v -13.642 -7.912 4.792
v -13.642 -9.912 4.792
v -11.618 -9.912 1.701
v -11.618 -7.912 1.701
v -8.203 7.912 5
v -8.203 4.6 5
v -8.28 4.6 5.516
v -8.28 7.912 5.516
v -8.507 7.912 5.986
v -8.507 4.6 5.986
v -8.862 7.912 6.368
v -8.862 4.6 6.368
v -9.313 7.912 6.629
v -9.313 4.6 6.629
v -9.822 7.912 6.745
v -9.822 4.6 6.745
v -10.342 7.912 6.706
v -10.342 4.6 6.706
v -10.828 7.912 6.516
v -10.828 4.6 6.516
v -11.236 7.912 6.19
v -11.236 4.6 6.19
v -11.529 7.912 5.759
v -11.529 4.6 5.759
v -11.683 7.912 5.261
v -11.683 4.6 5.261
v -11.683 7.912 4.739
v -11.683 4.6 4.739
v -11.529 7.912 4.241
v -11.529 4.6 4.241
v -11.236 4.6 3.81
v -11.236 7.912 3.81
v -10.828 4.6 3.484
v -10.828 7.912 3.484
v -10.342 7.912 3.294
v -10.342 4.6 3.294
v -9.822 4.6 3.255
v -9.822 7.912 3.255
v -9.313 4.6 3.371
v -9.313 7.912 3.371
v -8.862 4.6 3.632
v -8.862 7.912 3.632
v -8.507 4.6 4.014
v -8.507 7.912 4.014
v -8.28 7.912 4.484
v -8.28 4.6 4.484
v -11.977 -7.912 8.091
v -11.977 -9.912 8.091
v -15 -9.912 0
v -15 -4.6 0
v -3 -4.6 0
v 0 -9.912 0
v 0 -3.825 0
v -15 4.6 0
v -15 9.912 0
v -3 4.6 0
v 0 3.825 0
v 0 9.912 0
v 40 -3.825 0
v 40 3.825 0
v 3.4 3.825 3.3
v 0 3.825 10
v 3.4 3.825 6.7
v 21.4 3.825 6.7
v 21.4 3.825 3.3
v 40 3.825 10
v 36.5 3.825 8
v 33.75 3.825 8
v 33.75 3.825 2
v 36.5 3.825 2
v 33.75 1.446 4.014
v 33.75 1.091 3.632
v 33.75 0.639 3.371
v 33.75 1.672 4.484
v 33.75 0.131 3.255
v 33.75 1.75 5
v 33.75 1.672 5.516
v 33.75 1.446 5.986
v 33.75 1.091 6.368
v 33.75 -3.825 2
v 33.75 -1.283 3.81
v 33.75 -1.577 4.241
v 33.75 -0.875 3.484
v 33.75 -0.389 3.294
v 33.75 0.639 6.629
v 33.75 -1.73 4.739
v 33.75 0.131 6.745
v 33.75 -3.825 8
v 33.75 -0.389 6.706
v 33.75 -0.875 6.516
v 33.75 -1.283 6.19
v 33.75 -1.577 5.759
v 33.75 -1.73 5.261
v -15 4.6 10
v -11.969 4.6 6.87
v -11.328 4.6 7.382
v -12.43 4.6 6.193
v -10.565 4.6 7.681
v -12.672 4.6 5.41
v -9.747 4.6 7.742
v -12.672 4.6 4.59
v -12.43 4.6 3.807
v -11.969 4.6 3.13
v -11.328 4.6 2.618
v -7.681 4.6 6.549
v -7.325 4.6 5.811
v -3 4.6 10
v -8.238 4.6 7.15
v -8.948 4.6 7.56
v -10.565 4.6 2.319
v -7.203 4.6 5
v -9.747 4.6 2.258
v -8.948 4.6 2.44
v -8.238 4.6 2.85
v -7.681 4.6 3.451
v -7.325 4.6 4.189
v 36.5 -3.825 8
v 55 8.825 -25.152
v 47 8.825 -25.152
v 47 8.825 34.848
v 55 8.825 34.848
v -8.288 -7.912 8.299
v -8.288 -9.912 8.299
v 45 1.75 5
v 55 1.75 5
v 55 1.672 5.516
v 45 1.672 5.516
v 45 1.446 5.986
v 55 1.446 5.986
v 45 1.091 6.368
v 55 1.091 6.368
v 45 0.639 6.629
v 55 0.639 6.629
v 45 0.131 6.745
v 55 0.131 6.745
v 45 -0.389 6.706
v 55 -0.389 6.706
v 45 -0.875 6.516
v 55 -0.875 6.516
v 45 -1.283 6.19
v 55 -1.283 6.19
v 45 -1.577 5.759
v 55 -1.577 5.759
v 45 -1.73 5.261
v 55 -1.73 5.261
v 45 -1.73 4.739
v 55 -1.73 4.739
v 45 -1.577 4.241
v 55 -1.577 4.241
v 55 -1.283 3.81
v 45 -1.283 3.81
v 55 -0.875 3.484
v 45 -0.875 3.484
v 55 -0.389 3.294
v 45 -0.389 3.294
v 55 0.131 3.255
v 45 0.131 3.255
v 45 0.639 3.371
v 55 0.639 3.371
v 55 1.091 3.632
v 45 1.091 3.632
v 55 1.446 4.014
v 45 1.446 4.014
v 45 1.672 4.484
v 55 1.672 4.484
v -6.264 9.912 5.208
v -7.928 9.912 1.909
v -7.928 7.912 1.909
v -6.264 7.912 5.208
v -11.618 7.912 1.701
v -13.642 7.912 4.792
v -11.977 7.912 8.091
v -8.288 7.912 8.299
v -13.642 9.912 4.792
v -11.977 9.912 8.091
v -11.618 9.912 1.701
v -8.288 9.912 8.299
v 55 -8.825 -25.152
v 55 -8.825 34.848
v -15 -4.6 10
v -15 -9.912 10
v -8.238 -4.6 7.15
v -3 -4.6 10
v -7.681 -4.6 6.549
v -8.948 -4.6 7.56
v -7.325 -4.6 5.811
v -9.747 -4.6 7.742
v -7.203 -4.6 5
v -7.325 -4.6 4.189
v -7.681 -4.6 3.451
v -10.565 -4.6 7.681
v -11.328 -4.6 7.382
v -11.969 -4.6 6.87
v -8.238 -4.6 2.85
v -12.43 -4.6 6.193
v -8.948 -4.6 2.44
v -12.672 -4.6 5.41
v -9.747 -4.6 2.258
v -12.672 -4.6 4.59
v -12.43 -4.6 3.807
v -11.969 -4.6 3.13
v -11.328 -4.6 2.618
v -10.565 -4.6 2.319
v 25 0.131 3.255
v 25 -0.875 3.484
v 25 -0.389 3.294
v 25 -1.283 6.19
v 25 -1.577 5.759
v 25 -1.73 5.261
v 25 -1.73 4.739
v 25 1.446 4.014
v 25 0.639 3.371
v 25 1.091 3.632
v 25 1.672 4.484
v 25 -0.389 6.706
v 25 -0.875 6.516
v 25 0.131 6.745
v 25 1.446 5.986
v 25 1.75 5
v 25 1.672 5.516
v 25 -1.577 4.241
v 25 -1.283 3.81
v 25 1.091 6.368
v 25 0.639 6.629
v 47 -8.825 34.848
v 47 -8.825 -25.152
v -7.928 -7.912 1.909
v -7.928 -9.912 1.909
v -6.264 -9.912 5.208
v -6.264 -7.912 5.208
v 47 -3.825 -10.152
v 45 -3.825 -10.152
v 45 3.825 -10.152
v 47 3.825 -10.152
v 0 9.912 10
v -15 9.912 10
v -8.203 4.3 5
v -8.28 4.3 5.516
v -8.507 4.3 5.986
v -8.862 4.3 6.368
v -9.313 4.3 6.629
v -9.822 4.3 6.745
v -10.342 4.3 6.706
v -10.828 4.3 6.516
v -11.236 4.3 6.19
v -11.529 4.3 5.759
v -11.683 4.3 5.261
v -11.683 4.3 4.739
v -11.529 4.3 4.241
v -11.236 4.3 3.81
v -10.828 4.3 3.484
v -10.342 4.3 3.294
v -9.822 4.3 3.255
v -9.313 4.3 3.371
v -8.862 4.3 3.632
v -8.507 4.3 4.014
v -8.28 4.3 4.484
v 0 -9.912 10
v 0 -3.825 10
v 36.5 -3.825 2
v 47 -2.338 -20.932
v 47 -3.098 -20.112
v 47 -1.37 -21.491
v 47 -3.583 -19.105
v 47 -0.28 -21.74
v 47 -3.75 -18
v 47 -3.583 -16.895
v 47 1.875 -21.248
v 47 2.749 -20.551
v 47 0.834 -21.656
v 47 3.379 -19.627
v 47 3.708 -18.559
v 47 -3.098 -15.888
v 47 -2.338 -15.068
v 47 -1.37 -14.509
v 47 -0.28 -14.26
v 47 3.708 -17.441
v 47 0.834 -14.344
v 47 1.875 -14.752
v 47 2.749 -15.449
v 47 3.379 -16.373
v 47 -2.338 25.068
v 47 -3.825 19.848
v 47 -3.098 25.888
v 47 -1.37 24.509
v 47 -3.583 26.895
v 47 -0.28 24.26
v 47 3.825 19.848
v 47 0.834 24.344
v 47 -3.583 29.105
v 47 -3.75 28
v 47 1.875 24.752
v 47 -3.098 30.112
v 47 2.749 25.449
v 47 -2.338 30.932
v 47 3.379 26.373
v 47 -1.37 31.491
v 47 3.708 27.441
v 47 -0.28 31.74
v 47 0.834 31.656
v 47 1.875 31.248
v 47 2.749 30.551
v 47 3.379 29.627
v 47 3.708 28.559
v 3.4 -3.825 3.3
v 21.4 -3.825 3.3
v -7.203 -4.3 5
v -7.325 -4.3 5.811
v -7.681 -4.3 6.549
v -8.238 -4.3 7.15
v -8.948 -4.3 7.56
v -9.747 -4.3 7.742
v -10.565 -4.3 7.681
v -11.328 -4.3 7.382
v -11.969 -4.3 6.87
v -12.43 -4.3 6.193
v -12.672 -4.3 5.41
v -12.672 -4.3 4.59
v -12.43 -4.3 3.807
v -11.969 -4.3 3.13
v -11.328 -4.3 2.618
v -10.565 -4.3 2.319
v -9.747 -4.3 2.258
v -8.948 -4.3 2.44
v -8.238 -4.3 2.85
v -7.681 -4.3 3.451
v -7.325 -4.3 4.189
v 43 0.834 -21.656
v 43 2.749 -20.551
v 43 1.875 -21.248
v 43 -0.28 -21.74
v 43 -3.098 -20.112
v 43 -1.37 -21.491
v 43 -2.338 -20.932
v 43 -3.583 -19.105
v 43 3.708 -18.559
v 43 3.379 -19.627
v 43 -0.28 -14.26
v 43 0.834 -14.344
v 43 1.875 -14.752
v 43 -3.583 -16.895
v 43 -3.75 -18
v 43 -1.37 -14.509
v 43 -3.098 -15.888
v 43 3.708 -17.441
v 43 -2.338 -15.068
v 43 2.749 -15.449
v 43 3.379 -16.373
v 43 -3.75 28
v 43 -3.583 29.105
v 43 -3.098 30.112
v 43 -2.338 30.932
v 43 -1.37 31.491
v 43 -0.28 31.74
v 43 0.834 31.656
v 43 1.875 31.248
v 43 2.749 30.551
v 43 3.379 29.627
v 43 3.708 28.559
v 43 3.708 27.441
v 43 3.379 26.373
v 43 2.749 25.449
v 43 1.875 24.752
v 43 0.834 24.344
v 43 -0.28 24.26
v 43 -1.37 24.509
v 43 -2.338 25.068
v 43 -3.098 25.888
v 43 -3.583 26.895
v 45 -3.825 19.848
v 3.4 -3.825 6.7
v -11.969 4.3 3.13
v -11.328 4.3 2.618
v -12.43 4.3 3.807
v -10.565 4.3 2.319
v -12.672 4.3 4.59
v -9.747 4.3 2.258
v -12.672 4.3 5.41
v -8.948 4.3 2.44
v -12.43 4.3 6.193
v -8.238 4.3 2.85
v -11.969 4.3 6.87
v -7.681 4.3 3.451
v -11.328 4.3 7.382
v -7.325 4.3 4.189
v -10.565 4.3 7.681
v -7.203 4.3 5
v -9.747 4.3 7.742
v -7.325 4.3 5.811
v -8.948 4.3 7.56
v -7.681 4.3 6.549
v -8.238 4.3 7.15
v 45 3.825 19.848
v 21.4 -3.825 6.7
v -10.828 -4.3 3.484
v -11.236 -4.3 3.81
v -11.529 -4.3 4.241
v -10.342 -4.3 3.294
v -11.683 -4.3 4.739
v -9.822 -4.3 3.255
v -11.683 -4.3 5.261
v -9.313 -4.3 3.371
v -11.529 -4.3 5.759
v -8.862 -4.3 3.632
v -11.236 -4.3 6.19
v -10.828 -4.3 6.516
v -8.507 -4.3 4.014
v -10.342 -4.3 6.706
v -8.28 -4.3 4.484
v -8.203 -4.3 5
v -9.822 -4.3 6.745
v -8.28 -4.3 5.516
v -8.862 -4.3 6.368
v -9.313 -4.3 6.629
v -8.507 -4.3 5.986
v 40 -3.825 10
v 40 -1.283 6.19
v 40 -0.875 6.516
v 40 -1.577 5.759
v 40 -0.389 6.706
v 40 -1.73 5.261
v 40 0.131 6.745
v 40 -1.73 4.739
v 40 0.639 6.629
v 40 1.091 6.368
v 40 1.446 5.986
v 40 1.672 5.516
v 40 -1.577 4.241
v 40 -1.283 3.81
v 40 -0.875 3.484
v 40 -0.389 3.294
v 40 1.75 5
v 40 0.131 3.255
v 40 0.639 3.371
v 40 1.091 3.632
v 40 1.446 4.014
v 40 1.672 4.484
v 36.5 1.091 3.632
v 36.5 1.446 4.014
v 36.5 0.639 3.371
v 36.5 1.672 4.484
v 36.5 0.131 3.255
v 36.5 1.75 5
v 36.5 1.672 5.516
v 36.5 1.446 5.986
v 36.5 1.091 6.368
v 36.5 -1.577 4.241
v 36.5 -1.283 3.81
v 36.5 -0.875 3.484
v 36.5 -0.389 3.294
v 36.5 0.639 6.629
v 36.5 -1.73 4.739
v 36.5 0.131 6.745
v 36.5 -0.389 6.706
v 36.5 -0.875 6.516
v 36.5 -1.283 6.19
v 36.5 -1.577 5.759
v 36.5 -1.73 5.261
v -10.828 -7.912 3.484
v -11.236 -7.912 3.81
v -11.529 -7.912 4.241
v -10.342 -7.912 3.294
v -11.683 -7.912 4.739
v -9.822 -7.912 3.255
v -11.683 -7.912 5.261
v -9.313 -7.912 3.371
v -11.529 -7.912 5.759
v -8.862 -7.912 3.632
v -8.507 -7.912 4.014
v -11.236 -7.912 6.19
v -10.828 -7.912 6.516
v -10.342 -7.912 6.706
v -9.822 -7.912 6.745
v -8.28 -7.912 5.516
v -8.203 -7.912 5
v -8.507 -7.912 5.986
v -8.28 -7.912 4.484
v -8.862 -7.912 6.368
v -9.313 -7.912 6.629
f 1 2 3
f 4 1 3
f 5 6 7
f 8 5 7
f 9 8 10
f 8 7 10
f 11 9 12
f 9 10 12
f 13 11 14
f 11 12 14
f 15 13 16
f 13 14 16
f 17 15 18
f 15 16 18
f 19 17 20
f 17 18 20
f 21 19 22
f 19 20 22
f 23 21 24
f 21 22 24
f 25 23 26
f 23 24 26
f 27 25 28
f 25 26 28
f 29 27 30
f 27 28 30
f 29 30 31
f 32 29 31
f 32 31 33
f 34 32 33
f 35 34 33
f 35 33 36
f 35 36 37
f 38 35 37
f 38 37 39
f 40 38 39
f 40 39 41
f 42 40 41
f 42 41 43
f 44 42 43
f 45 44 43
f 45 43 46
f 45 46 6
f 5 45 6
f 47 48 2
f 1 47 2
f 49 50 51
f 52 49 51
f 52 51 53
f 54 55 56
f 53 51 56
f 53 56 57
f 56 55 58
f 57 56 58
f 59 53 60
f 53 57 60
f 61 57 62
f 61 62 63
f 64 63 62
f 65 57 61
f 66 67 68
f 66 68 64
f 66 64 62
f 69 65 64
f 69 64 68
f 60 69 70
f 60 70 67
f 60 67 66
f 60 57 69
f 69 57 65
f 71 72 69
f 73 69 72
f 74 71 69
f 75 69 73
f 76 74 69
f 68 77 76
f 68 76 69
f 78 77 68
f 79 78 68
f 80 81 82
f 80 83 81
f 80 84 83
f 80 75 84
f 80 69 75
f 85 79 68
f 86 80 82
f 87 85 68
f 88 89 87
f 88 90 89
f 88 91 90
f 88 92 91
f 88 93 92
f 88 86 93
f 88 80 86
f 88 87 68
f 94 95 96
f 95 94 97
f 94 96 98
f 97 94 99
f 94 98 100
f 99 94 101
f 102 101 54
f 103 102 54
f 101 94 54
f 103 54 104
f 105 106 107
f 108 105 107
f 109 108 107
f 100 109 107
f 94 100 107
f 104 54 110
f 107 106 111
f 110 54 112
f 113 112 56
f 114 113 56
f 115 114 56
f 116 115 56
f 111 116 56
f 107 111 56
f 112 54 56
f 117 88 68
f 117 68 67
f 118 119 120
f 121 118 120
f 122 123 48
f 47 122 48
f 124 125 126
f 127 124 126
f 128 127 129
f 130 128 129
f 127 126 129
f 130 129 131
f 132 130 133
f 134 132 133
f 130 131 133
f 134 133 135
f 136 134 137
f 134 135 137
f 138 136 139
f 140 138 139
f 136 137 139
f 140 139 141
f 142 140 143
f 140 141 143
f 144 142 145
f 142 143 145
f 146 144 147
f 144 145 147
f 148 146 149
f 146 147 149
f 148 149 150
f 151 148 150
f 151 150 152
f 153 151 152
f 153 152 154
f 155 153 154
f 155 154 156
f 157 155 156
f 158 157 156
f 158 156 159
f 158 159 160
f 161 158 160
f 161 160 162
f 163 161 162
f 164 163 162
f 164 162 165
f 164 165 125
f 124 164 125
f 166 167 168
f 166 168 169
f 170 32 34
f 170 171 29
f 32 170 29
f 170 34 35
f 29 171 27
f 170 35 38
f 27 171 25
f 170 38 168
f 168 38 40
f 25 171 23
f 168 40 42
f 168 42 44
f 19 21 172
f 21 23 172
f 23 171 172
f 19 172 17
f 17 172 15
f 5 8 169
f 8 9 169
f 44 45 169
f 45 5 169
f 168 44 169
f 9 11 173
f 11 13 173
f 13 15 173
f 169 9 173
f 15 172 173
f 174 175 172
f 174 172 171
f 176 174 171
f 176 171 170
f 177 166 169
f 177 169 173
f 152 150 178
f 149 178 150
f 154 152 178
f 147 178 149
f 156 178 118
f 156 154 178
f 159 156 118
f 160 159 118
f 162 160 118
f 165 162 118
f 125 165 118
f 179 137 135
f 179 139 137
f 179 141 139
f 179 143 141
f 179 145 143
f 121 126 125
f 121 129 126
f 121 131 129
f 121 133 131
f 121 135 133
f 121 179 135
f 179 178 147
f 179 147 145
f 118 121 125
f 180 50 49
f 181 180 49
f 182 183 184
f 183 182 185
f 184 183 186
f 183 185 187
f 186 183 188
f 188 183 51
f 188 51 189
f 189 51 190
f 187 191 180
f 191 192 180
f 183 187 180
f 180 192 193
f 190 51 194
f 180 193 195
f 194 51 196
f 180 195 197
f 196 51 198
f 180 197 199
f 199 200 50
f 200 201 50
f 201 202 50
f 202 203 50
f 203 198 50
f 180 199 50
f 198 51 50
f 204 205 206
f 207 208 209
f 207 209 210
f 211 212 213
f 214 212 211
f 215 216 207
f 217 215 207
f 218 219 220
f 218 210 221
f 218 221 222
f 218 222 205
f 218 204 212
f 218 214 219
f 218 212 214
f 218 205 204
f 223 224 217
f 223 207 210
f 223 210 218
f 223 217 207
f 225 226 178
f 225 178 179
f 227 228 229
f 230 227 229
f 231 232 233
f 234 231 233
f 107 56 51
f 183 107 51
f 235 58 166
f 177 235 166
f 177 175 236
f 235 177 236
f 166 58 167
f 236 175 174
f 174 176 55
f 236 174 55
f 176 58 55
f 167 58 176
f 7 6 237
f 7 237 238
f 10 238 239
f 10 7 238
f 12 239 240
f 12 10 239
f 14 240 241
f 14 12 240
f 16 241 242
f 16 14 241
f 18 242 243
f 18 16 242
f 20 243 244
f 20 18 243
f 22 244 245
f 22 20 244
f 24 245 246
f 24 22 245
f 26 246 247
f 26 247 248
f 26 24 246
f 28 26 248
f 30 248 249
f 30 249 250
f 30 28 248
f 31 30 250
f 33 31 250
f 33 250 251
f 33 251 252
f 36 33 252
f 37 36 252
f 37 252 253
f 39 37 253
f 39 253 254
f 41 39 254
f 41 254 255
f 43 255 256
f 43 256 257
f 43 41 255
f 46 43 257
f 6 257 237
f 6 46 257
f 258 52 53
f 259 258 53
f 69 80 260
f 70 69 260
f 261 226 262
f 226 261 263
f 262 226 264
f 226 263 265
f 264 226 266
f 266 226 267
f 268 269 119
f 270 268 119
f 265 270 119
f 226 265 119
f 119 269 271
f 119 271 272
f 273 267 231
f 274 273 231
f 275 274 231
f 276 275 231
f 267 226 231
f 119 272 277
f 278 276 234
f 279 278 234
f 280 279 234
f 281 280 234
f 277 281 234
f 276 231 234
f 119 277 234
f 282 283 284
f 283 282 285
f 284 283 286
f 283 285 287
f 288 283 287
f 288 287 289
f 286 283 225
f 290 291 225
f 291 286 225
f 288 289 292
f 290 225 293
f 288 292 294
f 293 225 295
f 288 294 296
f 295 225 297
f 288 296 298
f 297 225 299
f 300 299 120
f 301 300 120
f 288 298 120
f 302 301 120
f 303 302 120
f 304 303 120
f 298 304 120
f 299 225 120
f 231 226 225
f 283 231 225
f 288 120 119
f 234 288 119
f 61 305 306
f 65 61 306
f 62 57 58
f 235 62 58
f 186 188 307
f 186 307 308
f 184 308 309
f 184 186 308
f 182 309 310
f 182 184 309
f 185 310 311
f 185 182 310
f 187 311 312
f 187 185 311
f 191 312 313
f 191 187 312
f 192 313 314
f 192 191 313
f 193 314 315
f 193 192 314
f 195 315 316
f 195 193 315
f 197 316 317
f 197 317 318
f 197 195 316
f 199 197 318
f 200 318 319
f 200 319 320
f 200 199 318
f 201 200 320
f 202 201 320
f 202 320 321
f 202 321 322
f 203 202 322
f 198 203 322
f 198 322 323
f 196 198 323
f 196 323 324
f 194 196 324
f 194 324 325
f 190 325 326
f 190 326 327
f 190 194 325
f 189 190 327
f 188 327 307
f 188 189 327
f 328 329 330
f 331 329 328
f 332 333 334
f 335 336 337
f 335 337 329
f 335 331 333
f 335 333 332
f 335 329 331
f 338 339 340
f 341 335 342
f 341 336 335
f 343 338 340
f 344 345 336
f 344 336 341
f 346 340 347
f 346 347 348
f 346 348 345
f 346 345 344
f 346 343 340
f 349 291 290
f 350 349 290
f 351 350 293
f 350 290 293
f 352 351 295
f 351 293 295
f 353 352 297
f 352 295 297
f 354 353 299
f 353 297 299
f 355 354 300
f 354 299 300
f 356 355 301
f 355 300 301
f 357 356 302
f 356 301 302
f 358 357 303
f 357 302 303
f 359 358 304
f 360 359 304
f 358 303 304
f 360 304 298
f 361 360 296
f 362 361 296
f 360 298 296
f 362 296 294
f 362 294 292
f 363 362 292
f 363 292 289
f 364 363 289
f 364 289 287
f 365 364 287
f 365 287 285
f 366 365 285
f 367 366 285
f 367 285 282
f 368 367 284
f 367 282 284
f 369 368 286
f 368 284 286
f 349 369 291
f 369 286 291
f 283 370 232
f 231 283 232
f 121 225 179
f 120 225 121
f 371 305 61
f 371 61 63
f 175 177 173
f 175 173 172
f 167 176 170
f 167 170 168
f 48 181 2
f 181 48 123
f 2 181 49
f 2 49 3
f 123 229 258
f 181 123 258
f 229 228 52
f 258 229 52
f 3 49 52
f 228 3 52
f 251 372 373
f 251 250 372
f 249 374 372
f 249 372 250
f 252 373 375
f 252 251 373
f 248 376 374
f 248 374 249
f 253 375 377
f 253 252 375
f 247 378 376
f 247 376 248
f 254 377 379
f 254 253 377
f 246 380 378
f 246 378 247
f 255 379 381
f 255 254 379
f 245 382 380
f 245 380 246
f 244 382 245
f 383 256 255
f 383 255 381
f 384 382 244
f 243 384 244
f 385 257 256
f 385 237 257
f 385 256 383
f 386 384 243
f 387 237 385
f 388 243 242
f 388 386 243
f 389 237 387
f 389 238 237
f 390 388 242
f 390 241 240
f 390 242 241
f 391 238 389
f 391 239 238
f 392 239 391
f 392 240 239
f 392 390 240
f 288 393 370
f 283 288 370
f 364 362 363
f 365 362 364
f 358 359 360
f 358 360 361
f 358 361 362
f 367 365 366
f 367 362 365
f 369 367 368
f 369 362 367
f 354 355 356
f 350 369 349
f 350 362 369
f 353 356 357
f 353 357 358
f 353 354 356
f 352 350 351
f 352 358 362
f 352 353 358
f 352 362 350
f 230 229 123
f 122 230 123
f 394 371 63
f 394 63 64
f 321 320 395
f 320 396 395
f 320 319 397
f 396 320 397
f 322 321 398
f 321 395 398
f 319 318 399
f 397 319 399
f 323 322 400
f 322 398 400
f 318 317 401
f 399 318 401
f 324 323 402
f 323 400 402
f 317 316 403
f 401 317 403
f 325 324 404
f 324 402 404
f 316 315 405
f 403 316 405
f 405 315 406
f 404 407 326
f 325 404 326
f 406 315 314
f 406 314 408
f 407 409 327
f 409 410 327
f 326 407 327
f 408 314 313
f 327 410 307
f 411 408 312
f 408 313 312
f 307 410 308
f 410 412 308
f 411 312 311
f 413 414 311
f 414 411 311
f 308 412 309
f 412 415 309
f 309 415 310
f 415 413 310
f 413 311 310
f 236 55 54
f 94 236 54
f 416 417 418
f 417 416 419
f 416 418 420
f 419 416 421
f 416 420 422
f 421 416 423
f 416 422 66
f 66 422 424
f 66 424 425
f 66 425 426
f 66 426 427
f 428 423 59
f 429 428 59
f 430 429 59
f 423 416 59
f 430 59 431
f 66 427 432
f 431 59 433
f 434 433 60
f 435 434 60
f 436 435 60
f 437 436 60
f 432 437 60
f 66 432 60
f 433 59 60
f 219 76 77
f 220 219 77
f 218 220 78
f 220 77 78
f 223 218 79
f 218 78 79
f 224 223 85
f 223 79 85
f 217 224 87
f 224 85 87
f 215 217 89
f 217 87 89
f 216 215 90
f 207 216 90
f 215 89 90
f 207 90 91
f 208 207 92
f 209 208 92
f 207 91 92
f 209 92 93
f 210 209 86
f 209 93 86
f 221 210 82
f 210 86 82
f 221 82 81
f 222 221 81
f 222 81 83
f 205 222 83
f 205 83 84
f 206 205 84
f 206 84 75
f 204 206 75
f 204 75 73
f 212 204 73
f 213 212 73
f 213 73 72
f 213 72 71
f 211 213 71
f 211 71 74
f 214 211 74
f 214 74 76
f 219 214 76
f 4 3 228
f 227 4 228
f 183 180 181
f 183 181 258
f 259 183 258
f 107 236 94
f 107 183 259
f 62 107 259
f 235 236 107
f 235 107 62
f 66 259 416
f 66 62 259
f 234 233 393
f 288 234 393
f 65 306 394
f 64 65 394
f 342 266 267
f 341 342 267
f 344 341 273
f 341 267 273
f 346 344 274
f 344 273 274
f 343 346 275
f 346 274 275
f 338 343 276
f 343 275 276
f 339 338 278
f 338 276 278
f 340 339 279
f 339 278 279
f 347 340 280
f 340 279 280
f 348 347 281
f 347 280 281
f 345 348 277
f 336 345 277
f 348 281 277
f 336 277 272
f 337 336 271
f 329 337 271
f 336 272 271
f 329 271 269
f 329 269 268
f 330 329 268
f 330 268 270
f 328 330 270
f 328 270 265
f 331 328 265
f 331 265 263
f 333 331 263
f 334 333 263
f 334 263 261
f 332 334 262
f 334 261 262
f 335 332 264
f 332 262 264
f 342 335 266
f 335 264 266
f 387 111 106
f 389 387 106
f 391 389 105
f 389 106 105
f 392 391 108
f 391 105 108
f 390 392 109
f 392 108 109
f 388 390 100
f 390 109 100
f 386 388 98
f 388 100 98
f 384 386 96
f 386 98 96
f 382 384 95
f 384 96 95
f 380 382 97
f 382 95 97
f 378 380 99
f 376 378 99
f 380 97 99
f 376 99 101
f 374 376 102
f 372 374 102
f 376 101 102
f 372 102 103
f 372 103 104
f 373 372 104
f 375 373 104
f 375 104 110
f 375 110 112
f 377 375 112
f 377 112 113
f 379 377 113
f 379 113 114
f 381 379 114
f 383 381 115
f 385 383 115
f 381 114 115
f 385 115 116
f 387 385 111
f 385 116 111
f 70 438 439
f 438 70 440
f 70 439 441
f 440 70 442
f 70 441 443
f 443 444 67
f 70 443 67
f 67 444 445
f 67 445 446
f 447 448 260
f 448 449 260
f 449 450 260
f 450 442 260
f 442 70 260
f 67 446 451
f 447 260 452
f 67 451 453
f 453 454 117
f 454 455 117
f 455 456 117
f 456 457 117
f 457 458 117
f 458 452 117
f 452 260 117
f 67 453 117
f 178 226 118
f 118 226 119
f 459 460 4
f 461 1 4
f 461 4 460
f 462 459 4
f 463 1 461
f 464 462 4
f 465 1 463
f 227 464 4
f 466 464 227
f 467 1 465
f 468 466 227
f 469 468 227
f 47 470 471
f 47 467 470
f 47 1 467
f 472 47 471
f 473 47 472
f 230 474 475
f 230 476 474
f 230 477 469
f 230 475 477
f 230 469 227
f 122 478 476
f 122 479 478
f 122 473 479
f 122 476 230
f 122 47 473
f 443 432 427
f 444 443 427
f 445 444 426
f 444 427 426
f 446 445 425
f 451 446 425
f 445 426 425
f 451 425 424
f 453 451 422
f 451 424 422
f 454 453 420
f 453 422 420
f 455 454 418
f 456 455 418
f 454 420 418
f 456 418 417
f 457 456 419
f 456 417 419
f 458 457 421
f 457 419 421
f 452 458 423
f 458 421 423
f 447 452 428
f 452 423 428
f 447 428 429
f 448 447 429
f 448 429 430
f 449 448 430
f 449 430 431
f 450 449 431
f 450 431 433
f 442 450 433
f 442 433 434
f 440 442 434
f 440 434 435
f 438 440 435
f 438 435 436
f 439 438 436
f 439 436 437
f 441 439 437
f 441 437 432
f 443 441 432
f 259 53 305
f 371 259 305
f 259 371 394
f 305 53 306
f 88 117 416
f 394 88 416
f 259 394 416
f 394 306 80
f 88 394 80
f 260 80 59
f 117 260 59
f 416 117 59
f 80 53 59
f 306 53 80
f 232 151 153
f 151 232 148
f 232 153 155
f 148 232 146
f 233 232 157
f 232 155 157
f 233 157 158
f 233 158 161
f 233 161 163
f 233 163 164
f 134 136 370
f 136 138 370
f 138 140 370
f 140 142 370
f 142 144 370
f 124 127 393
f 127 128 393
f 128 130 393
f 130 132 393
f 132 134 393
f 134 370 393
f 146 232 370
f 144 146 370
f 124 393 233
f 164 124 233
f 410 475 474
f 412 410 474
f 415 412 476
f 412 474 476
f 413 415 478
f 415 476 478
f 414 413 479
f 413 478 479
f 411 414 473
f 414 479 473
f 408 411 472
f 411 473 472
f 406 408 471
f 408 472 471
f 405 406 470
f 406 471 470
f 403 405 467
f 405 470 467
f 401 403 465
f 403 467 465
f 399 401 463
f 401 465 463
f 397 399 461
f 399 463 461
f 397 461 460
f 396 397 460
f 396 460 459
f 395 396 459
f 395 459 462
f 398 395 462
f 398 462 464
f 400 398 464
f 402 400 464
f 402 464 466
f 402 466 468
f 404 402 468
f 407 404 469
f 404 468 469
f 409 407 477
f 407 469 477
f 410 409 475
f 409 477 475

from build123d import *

# Parameters (mm, degrees)
F0_W      = 40
F0_H      = 3.825
F1_DEPTH  = 10
F2_R      = 1.75
F3_DEPTH  = 19.8241538475
F4_W      = 18
F4_H      = 3.4
F4_W_2    = 2.75
F4_H_2    = 6
F5_DEPTH  = 13.7375769237
F6_R      = 1.75
F7_DEPTH  = 15
F10_DEPTH = 2
F11_W     = 17.65
F11_H     = 60
F12_DEPTH = 8
F13_R     = 1.75
F14_DEPTH = 70.001
F15_R     = 2.75
F15_R_2   = 1.75
F16_DEPTH = 0.3
F17_R     = 1.75
F18_DEPTH = 2
F19_R     = 3.75
F20_DEPTH = 4


# Not quite as in the source:
# - a pattern or mirror of a feature is missing from the dataset's text; its kind, count and spacing are read off the source's solid


with BuildPart() as f1:
    # F0 (on Top) → F1 (new body)
    with BuildSketch(Plane.XY):
        Polygon((0, -3.825), (0, 0), (-3, 0), (-3, -4.6), (-15, -4.6), (-15, -9.9115769237), (0, -9.9115769237), align=None)
        Polygon((-3, 0), (0, 0), (0, 3.825), (0, 9.9115769237), (-15, 9.9115769237), (-15, 4.6), (-3, 4.6), align=None)
        with Locations((20, 1.9125)):
            Rectangle(F0_W, F0_H)
        with Locations((20, -1.9125)):
            Rectangle(F0_W, F0_H)
    extrude(amount=F1_DEPTH)

    # F2 (on face) → F3 (cut, through all)
    with BuildSketch(Plane.XZ.offset(9.9115769237)):
        with Locations((-9.9527407438, 5)):
            Circle(F2_R)
    extrude(amount=-F3_DEPTH, mode=Mode.SUBTRACT)

    # F4 (on face) → F5 (cut, through all)
    with BuildSketch(Plane.XZ.offset(3.825)):
        with Locations((12.4002694301, 5)):
            Rectangle(F4_W, F4_H)
        with Locations((35.125, 5)):
            Rectangle(F4_W_2, F4_H_2)
    extrude(amount=-F5_DEPTH, mode=Mode.SUBTRACT)

    # F6 (on face) → F7 (cut)
    with BuildSketch(Plane.YZ.offset(40)):
        with Locations((0, 5)):
            Circle(F6_R)
    extrude(amount=-F7_DEPTH, mode=Mode.SUBTRACT)

    # F15 (on face) → F16 (join)
    with BuildSketch(Plane.XZ.offset(-4.6)):
        with Locations((-9.9527407438, 5)):
            Circle(F15_R)
        with Locations((-9.9527407438, 5)):
            Circle(F15_R_2, mode=Mode.SUBTRACT)
    f16 = extrude(amount=F16_DEPTH)

    # F16_copies: F16 across plane
    add(f16.mirror(Plane(origin=(0, 0, 0), x_dir=(0, 0, -1), z_dir=(0, -1, 0))))

    # F17 (on face) → F18 (cut)
    with BuildSketch(Plane.XZ.offset(9.9115769237)):
        Polygon((-7.9284293953, 1.9088033227), (-6.2635302189, 5.2075067143), (-8.2878415673, 8.2987033916), (-11.9770520922, 8.0911966773), (-13.6419512686, 4.7924932857), (-11.6176399202, 1.7012966084), align=None)
        with Locations((-9.9527407438, 5)):
            Circle(F17_R, mode=Mode.SUBTRACT)
    f18 = extrude(amount=-F18_DEPTH, mode=Mode.SUBTRACT)

    # F18_copies: F18 across plane
    add(f18.mirror(Plane.ZX), mode=Mode.SUBTRACT)


with BuildPart() as f10:
    # F9 (on offset) → F10 (new body)
    with BuildSketch(Plane.YZ.offset(45)):
        Polygon((3.825, 0), (3.825, 10), (3.825, 19.8484882712), (-3.825, 19.8484882712), (-3.825, 10), (-3.825, 0), (-3.825, -10.1515117288), (3.825, -10.1515117288), align=None)
    extrude(amount=F10_DEPTH)

    # F11 (on face) → F12 (join)
    with BuildSketch(Plane.YZ.offset(47)):
        with Locations((0, 4.8484882712)):
            Rectangle(F11_W, F11_H)
    extrude(amount=F12_DEPTH)

    # F13 (on face) → F14 (cut, through all)
    with BuildSketch(Plane.YZ.offset(55)):
        with Locations((0, 5)):
            Circle(F13_R)
    extrude(amount=-F14_DEPTH, mode=Mode.SUBTRACT)

    # F19 (on face) → F20 (join)
    with BuildSketch(Plane(origin=(47, 0, 0), x_dir=(0, -1, 0), z_dir=(-1, 0, 0))):
        with Locations((0, 28)):
            Circle(F19_R)
        with Locations((0, -18)):
            Circle(F19_R)
    extrude(amount=F20_DEPTH)


solid = Compound([f1.part, f10.part])
